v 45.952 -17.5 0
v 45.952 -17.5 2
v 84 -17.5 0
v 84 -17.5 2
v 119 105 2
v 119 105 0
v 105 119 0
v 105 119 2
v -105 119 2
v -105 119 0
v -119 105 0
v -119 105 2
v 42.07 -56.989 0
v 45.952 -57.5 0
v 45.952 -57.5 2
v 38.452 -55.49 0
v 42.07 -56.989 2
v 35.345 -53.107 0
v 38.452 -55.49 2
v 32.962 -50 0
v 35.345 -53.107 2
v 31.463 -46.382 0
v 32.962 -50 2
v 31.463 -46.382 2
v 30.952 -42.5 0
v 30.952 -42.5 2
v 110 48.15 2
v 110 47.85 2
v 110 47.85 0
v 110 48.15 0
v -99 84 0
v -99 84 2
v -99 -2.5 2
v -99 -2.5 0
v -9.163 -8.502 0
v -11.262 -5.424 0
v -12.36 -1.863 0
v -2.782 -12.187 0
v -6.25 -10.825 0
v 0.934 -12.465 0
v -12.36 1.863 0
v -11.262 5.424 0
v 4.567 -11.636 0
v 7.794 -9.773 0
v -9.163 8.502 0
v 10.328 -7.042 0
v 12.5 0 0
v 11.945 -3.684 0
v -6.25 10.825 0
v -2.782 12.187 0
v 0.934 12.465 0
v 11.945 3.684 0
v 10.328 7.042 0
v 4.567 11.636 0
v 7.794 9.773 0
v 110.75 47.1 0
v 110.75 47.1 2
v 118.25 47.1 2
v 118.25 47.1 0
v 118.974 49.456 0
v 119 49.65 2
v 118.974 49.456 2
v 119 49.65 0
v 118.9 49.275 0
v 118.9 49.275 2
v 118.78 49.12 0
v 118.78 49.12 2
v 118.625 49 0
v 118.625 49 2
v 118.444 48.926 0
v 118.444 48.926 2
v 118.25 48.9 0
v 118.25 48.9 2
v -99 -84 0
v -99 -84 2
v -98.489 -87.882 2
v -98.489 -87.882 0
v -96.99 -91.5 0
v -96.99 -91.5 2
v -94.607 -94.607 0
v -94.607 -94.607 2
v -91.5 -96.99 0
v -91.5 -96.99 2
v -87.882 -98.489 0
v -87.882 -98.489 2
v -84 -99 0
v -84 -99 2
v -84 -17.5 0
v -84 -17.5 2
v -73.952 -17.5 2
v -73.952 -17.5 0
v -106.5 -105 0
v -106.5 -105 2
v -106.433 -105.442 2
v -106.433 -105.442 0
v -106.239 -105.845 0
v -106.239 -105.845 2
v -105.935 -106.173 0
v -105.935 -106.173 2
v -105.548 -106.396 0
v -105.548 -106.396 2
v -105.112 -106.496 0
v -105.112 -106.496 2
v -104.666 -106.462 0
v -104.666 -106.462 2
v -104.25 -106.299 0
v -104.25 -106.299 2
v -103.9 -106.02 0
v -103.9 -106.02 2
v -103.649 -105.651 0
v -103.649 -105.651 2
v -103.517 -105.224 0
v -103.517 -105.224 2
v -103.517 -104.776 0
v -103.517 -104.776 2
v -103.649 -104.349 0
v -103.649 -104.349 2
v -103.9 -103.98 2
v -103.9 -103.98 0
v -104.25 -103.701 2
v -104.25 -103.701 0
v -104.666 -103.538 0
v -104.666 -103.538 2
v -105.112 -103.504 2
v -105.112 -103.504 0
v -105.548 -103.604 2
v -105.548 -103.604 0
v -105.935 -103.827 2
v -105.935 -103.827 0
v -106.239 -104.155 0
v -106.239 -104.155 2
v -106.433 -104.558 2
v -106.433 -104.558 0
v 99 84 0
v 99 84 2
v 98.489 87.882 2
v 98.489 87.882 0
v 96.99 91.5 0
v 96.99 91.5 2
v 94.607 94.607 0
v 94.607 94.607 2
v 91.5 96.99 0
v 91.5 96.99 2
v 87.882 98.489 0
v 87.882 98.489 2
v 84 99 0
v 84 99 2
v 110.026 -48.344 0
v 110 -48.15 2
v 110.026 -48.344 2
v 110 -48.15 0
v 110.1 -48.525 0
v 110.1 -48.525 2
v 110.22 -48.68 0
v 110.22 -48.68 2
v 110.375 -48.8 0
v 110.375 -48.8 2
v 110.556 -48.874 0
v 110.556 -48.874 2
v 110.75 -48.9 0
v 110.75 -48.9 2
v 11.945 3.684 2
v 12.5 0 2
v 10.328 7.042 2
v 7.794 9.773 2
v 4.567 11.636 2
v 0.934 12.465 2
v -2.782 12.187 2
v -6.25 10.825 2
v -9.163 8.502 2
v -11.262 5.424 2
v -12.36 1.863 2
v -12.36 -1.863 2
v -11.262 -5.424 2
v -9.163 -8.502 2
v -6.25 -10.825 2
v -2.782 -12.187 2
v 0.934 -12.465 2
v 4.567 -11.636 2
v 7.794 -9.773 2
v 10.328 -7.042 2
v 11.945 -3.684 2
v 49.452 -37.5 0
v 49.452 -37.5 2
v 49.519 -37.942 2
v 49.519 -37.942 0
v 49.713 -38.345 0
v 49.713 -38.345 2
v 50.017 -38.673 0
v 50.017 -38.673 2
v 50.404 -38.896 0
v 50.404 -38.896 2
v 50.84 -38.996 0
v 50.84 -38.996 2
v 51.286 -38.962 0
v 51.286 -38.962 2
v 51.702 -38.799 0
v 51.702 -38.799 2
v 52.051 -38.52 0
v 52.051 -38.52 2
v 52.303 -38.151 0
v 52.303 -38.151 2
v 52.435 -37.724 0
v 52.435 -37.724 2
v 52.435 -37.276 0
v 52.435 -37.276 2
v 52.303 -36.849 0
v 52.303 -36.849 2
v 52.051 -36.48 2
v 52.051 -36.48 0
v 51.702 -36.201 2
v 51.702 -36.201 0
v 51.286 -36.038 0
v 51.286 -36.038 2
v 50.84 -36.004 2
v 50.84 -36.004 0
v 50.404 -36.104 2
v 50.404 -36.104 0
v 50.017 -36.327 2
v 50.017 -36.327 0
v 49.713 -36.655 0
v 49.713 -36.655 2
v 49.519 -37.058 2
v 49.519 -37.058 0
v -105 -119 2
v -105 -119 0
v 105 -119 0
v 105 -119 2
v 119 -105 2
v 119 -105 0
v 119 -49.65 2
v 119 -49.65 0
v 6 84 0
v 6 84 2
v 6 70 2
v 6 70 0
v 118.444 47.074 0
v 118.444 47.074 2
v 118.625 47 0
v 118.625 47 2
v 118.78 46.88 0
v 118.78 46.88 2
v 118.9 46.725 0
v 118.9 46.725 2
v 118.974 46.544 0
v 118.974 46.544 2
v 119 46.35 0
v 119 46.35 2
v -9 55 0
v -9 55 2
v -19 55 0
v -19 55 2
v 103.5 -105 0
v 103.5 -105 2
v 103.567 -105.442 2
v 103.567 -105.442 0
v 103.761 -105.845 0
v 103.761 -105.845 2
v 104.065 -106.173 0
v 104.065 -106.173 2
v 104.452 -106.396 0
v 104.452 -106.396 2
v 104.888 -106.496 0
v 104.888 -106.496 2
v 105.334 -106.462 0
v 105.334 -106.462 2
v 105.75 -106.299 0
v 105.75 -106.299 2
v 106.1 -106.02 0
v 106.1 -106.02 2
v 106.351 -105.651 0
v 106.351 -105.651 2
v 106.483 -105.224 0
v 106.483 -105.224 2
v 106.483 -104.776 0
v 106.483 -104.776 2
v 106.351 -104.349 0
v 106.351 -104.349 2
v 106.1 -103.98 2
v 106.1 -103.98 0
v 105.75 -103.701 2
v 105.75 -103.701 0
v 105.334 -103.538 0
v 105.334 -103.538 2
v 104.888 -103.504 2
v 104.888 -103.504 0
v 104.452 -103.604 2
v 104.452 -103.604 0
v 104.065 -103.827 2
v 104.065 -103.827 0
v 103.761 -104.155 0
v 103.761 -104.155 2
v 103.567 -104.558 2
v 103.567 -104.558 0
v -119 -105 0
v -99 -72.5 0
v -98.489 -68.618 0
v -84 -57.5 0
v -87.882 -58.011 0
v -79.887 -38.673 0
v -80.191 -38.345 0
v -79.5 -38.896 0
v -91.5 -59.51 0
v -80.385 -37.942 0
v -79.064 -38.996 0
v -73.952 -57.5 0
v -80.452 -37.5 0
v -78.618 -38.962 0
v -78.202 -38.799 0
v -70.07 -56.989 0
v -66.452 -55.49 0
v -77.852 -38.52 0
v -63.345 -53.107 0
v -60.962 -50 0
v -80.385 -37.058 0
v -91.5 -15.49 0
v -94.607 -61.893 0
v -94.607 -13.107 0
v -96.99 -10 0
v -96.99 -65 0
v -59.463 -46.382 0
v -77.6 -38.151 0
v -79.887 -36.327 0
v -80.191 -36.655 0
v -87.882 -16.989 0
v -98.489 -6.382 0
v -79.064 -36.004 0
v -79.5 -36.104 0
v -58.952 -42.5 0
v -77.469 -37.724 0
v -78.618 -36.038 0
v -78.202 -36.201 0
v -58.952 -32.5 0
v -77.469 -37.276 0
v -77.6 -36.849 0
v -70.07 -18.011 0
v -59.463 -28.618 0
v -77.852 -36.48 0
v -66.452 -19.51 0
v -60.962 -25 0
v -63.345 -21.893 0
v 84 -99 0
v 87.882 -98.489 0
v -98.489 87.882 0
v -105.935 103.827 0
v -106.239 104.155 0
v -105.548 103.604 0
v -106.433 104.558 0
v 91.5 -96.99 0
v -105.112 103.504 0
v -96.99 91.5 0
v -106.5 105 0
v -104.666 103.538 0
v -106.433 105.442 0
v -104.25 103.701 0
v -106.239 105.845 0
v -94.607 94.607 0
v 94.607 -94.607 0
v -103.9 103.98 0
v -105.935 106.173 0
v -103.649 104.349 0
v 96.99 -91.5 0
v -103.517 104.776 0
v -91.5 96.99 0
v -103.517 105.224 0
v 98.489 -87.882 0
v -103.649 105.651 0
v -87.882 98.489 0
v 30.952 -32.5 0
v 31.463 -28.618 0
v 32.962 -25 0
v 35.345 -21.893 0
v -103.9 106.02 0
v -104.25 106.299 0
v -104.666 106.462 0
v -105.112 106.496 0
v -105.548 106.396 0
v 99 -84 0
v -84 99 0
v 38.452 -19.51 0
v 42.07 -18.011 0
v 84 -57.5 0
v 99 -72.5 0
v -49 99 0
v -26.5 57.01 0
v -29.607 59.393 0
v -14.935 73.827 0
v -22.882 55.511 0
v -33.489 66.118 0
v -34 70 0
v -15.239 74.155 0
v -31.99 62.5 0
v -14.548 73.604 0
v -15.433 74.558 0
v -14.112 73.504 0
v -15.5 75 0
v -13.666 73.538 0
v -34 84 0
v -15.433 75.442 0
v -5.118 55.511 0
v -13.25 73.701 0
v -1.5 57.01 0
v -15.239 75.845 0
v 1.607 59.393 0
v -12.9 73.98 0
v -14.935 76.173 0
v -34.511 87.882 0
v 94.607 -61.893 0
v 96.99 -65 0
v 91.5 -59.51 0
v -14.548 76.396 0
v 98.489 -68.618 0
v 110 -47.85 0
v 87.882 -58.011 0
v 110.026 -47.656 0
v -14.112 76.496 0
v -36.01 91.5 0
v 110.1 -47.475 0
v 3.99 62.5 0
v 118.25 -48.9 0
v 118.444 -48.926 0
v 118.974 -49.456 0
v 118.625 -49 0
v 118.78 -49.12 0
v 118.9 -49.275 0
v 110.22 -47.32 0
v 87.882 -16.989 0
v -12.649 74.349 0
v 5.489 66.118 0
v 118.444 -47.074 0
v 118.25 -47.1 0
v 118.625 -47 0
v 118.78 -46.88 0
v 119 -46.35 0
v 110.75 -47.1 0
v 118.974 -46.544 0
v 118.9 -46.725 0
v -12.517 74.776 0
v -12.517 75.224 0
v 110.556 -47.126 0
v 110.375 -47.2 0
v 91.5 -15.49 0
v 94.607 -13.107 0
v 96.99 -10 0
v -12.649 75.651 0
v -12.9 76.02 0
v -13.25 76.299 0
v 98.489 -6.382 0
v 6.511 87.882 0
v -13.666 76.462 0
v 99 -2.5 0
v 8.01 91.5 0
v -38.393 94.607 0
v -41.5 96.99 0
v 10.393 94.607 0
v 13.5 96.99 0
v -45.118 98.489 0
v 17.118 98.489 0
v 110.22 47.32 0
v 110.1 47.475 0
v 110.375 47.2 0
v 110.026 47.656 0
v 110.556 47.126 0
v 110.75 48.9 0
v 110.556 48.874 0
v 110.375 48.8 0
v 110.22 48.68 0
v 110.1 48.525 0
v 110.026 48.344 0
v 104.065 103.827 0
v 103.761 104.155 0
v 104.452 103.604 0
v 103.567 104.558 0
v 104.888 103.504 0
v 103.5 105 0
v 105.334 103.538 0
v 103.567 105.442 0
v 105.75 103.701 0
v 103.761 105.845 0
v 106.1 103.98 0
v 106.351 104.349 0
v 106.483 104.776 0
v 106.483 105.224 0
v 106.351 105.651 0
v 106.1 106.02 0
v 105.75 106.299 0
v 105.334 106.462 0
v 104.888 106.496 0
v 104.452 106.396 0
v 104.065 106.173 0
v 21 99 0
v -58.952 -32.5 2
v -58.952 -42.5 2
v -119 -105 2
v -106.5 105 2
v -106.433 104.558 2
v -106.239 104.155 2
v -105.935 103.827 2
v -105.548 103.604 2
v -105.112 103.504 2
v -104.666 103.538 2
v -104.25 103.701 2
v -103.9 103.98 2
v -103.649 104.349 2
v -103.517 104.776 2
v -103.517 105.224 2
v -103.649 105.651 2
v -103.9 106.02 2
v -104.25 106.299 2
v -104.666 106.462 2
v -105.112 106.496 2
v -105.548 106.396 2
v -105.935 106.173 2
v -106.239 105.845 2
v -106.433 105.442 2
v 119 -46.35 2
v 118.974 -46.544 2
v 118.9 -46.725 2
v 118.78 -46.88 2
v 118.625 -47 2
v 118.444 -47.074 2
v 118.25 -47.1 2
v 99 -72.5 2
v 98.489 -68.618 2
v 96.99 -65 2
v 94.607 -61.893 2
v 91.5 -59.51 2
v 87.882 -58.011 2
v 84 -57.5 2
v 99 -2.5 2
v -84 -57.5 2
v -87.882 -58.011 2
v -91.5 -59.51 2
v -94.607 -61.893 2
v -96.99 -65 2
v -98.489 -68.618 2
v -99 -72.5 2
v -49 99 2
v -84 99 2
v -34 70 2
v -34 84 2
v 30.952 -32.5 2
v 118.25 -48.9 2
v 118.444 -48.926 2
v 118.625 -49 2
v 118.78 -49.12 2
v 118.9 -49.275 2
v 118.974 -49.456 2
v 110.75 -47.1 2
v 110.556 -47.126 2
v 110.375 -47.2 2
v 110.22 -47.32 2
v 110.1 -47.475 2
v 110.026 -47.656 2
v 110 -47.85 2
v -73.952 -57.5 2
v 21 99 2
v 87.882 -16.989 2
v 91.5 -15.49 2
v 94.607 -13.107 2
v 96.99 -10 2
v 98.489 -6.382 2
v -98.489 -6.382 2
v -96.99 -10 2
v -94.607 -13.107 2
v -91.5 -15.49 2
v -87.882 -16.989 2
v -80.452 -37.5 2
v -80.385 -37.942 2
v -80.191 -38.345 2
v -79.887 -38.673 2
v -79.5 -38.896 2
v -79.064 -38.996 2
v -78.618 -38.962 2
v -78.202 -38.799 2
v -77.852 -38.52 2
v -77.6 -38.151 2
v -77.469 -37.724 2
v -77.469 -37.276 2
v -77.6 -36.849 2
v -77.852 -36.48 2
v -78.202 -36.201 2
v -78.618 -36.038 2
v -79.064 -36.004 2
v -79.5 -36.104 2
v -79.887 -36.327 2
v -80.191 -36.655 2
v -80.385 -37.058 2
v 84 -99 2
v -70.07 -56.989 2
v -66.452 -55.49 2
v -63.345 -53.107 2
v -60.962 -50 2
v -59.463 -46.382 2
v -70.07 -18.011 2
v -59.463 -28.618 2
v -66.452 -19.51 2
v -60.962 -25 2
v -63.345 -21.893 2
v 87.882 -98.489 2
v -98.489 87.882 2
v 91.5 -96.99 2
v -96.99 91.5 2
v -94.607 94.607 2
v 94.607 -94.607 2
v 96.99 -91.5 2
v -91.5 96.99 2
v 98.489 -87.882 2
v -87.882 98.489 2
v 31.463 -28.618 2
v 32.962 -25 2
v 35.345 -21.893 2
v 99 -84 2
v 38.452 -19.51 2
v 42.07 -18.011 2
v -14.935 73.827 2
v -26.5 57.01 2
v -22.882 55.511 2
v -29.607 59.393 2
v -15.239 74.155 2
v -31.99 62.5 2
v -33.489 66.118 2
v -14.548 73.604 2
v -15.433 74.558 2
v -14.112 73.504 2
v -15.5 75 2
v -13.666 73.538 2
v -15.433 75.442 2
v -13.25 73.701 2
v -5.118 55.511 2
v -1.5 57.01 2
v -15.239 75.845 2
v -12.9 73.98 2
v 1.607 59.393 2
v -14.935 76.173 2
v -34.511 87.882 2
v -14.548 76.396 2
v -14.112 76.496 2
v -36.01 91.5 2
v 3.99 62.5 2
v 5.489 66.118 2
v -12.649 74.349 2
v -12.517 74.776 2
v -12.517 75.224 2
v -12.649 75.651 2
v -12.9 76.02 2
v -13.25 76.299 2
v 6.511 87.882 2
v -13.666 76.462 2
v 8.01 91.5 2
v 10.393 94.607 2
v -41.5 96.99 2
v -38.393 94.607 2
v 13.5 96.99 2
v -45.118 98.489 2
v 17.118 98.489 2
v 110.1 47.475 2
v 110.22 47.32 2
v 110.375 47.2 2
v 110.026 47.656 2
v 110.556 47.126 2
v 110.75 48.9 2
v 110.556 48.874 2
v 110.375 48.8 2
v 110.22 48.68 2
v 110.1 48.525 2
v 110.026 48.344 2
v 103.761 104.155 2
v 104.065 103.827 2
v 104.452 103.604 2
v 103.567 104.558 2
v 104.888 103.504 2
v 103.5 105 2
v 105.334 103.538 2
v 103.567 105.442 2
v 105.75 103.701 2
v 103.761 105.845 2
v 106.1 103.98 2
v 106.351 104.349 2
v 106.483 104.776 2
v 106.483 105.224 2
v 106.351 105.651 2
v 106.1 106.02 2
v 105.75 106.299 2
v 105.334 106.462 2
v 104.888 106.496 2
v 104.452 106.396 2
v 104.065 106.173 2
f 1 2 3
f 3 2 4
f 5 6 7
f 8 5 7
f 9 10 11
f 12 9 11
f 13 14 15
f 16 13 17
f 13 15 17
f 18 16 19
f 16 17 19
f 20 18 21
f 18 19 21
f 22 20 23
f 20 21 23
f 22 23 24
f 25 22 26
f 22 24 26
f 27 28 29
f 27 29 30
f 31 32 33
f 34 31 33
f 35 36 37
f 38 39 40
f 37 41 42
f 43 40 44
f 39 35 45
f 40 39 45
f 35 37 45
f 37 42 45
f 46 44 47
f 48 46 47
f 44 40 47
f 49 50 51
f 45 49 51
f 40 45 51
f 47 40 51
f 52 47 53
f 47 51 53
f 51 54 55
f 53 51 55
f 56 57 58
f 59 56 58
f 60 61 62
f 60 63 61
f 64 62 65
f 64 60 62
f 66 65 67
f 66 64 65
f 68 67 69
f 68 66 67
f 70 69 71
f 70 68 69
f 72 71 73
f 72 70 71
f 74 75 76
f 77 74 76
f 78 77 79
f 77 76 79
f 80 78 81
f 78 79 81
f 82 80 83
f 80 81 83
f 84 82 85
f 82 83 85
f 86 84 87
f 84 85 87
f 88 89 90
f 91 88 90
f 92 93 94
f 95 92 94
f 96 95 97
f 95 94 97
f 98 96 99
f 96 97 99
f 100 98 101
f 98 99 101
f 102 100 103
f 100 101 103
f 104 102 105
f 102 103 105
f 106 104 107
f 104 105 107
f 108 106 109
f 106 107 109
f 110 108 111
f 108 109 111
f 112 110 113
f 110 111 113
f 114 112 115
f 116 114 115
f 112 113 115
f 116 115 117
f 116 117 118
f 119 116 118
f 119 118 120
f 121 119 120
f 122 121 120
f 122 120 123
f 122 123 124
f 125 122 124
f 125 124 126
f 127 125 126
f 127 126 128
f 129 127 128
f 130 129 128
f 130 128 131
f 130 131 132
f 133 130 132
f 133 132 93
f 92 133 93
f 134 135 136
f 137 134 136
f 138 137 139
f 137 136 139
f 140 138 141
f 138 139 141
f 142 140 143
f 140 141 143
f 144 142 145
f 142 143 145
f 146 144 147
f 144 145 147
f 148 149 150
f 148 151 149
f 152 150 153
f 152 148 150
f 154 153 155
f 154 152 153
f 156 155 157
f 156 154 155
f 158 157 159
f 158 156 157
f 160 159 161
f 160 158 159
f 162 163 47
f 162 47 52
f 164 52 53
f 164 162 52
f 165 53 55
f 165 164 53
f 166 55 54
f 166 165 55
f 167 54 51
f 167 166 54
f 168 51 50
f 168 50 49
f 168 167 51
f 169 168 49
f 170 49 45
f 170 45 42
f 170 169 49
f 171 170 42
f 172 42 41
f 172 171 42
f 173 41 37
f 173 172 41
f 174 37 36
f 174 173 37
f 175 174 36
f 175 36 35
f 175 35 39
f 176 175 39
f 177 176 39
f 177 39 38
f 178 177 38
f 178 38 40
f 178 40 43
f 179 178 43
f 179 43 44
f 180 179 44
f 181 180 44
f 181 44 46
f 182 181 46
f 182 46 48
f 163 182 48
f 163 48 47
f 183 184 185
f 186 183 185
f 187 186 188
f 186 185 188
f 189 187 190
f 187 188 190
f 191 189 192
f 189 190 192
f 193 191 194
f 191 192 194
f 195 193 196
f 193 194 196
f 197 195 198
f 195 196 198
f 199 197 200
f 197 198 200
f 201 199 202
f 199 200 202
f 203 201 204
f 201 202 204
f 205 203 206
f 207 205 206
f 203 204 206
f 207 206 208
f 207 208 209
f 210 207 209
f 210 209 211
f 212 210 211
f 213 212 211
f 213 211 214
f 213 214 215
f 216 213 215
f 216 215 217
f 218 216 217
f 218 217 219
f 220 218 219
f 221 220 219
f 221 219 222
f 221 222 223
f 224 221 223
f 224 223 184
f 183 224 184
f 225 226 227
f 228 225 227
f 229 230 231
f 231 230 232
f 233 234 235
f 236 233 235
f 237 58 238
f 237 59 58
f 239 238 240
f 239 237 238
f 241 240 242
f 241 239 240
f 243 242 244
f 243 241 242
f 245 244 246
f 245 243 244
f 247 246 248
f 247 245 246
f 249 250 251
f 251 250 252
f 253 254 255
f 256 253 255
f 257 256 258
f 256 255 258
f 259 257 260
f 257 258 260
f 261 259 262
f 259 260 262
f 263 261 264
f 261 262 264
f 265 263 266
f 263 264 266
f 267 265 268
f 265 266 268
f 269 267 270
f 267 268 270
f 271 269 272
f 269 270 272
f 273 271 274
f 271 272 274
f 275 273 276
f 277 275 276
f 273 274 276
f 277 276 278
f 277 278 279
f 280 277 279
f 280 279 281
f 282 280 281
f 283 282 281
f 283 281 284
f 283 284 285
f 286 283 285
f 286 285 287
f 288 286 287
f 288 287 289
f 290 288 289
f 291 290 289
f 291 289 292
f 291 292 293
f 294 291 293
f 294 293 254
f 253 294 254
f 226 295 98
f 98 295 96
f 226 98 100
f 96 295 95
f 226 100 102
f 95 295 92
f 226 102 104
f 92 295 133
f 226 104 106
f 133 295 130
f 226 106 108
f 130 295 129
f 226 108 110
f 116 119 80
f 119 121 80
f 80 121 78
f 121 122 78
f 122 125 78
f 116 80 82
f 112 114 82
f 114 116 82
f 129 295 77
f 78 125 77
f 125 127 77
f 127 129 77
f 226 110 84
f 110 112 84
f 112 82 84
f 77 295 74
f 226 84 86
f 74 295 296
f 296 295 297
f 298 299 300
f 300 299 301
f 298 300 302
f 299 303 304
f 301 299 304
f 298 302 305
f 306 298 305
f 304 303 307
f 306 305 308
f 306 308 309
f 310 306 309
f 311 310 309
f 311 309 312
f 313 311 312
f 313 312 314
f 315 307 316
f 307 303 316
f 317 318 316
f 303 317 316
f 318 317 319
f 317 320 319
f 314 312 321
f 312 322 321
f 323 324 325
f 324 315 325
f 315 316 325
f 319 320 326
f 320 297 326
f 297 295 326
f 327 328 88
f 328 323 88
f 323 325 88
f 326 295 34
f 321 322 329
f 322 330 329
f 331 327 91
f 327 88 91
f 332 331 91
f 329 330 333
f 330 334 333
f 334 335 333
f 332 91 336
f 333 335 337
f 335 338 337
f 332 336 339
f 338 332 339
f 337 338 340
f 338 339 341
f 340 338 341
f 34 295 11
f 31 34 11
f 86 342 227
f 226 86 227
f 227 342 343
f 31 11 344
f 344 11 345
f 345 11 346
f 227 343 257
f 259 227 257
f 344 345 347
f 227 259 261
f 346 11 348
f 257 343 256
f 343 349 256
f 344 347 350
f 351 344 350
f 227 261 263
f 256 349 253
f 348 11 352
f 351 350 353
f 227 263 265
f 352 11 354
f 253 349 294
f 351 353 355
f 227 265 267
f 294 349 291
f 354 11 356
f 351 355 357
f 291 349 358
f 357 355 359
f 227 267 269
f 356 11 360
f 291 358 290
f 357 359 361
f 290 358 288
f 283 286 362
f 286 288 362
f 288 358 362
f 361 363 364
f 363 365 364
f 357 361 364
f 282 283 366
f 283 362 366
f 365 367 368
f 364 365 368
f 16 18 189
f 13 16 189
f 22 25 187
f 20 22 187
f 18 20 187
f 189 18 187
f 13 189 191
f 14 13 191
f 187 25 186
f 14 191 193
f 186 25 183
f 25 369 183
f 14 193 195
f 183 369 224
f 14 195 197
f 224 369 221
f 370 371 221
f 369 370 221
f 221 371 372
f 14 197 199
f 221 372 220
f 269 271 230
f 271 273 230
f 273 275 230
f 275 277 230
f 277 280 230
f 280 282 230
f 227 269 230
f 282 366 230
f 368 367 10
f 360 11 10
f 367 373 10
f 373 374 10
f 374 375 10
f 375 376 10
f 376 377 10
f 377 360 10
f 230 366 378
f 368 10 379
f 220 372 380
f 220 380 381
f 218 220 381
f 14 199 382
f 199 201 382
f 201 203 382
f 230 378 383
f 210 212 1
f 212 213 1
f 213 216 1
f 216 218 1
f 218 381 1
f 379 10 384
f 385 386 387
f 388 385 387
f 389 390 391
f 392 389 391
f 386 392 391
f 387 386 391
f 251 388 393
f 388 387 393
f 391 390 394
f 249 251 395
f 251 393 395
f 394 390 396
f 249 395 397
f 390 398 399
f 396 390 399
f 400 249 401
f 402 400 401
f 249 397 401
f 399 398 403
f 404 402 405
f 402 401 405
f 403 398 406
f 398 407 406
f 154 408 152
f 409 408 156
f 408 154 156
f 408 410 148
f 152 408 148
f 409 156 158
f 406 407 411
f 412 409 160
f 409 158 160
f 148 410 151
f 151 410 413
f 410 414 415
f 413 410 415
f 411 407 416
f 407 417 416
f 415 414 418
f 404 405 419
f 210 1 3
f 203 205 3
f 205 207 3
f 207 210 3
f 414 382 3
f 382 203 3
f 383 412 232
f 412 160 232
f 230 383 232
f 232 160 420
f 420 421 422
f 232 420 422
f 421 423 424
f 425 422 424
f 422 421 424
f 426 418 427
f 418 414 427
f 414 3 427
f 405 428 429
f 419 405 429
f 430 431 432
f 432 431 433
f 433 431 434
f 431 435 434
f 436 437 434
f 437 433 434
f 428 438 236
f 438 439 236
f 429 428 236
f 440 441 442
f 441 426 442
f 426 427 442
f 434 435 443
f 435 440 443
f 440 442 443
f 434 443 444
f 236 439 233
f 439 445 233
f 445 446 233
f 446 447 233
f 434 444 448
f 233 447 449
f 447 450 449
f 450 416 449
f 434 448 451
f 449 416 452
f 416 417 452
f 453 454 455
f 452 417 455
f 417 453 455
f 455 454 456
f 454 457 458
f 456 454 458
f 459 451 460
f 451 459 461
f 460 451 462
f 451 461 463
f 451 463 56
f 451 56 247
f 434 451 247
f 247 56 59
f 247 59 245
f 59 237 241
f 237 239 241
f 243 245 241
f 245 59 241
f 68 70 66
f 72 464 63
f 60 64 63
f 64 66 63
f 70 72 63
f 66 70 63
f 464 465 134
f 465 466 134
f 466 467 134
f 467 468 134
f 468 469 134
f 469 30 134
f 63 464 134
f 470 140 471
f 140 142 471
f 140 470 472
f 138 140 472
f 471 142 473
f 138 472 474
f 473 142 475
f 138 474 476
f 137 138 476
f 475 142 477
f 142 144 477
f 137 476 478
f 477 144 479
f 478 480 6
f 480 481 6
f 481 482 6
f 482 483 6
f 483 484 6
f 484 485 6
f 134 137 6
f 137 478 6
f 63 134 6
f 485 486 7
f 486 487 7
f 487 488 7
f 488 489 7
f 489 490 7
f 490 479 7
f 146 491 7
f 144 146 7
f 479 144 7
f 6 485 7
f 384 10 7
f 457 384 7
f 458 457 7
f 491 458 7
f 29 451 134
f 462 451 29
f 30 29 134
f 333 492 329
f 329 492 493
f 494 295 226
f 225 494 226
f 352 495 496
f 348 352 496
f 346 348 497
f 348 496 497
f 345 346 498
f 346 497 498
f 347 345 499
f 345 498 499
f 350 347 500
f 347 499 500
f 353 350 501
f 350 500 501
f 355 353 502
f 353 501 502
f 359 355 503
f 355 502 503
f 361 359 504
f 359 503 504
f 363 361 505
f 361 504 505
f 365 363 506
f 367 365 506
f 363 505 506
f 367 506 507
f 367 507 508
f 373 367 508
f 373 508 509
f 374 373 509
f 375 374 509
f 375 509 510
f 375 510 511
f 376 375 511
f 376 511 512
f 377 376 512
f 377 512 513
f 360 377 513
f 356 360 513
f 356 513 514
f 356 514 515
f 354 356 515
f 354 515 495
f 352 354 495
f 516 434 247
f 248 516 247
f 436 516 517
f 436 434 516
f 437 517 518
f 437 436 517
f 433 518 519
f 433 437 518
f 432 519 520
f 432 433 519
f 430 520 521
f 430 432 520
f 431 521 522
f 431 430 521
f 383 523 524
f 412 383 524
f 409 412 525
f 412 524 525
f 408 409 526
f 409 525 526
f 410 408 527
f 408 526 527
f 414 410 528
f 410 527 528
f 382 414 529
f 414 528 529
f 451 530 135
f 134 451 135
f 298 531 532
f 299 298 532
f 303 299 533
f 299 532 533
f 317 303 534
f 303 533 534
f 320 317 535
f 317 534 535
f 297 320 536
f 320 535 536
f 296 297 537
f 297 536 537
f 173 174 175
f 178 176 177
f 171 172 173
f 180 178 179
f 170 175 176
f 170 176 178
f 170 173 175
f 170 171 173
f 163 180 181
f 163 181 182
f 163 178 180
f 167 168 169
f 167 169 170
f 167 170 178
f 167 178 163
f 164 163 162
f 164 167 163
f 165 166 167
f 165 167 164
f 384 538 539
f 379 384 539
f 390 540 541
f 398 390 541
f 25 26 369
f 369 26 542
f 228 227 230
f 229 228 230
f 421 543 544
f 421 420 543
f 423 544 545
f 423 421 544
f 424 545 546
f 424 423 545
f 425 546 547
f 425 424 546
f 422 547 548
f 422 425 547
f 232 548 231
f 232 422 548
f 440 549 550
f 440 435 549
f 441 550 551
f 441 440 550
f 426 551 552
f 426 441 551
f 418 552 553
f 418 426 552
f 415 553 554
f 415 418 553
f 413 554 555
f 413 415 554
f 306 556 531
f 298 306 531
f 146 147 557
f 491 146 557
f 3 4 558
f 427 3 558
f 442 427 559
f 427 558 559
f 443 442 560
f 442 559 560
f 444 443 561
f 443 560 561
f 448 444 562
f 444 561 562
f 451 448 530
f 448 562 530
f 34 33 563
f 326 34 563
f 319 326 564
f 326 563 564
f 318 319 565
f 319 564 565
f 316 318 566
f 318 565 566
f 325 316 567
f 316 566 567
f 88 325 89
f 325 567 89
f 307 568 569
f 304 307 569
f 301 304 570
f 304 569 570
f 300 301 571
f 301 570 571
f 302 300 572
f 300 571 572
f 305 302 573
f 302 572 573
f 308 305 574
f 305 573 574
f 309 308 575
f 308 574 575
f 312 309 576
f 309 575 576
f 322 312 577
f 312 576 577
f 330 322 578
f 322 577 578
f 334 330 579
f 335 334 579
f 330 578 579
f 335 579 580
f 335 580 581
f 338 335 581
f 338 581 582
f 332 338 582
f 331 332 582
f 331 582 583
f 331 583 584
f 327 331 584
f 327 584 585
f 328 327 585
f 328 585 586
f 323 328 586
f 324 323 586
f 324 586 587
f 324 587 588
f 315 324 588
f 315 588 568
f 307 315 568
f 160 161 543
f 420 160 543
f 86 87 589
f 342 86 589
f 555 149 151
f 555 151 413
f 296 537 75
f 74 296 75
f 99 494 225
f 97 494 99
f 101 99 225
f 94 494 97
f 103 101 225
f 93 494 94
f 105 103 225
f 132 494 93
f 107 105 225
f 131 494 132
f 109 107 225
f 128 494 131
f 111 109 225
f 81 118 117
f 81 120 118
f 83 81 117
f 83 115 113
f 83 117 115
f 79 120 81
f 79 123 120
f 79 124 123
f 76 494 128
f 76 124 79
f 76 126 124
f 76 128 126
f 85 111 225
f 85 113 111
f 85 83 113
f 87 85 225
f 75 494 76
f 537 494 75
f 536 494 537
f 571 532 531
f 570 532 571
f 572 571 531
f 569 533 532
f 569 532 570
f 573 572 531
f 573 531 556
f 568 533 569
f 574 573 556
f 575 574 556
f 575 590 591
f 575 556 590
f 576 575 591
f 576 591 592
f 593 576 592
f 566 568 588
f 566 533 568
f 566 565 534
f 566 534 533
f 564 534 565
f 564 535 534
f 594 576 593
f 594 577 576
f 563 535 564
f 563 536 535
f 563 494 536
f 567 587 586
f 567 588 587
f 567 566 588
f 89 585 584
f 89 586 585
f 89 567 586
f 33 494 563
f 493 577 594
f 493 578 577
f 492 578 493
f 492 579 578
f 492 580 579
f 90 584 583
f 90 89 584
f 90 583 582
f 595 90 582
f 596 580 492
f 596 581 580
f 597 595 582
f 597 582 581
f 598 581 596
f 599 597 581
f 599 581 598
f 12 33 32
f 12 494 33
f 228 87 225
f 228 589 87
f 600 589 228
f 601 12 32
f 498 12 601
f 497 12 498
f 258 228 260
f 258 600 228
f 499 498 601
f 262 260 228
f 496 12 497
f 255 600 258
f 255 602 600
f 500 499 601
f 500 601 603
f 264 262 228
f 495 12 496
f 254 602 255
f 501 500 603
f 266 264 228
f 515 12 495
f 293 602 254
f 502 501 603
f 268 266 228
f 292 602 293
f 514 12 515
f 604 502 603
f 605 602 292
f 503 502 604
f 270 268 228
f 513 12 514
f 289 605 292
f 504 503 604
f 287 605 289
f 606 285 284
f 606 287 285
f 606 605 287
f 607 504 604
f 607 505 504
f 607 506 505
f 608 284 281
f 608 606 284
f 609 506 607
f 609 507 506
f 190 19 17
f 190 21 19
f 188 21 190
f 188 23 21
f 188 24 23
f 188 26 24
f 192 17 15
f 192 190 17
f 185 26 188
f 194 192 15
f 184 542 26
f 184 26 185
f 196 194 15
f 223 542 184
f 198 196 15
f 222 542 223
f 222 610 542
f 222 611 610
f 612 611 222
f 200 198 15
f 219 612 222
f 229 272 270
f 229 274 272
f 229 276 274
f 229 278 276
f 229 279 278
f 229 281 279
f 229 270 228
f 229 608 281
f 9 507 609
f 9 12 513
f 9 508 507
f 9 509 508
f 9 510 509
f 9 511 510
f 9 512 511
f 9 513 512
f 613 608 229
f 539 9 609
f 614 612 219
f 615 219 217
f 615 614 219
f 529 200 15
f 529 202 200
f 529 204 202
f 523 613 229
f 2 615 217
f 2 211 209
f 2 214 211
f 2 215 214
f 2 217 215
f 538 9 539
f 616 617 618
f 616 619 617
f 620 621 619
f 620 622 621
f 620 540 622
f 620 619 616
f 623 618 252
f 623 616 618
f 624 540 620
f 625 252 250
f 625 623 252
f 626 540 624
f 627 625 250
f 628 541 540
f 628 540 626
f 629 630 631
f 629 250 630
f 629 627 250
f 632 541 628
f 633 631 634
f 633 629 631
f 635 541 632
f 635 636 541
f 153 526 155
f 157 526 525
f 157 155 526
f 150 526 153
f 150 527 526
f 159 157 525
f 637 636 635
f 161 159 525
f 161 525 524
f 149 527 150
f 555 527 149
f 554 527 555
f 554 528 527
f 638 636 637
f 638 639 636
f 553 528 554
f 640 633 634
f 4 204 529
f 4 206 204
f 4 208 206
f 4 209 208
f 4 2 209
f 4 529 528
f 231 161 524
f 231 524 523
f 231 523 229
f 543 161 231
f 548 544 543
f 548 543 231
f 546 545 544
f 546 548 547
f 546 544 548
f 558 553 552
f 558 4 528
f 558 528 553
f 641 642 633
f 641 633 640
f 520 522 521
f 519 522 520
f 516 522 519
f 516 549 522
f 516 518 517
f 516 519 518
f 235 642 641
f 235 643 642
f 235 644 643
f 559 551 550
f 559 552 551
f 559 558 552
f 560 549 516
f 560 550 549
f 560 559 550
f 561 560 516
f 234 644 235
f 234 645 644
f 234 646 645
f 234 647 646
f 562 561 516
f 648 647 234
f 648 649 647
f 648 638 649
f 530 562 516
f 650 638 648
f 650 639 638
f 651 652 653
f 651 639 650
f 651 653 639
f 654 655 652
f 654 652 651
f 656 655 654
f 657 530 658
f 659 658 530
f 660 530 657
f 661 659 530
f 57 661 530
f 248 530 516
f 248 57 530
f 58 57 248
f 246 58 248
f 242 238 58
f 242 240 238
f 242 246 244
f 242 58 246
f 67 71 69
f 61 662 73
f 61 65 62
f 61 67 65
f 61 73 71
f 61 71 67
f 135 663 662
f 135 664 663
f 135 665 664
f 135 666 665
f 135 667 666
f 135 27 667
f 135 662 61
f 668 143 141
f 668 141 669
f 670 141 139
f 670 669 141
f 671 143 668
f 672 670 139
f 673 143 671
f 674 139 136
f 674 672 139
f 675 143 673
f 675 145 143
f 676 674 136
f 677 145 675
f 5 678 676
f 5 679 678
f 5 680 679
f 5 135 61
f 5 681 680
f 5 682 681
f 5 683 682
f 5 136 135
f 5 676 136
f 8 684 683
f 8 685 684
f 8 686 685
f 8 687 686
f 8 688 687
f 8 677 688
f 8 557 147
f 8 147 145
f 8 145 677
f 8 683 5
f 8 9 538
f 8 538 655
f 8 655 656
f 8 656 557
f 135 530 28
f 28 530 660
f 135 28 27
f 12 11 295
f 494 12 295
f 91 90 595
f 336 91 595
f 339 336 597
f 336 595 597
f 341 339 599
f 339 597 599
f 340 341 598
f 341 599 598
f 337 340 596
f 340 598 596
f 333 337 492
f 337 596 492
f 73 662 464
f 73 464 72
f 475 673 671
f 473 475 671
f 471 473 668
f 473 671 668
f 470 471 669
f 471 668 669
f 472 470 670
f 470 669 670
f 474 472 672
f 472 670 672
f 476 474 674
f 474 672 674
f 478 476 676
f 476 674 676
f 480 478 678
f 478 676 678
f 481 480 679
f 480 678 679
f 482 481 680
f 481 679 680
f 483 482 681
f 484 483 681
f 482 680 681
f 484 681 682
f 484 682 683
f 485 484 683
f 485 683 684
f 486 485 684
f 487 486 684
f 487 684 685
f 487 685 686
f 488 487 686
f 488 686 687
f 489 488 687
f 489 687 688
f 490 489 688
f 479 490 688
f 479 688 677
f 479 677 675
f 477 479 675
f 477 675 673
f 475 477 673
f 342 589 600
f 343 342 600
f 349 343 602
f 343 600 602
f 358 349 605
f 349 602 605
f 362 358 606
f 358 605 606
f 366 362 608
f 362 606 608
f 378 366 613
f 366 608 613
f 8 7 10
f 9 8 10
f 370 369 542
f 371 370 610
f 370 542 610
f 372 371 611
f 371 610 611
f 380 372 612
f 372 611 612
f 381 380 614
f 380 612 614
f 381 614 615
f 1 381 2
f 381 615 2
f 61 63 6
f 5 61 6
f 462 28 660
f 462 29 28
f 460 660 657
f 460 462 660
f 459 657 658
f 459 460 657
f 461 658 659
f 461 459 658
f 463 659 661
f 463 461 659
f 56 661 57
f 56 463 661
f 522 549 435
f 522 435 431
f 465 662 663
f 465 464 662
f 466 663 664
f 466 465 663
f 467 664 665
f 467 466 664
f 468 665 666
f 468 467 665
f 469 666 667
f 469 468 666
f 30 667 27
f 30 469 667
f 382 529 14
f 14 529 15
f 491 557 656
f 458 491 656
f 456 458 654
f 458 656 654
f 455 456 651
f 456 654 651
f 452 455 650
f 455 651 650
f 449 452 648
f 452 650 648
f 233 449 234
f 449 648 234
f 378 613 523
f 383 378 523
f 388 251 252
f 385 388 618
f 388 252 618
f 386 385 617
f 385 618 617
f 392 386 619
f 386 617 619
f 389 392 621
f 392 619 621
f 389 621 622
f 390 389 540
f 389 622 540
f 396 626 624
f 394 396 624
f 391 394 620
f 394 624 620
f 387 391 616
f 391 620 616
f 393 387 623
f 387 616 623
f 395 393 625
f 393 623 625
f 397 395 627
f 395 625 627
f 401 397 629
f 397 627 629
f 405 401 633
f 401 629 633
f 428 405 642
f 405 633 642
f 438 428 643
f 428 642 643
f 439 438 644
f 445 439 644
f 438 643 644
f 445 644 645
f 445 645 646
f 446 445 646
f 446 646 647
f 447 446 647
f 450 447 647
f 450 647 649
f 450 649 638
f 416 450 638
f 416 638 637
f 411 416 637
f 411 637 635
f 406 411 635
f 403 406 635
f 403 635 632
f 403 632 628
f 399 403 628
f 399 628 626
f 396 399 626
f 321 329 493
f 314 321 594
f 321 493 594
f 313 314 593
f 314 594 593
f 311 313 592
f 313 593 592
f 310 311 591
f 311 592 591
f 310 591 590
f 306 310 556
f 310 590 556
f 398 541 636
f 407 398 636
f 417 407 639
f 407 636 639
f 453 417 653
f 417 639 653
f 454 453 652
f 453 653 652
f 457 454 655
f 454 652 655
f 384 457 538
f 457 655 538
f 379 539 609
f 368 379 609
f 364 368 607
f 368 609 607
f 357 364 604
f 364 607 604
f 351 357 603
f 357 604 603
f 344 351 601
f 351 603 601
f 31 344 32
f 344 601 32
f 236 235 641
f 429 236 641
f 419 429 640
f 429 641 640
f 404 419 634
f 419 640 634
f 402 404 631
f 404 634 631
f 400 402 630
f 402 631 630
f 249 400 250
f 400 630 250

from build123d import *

# Parameters (mm, degrees)
F1_DEPTH = 2
F2_D     = 3
F3_R     = 12.5
F3_W     = 9
F3_H     = 1.8
F4_DEPTH = 25
F5_R     = 0.75


with BuildPart() as f1:
    # F0 (on Top) → F1 (new body)
    with BuildSketch(Plane.XY):
        Polygon((119, 105), (105, 119), (-105, 119), (-119, 105), (-119, -105), (-105, -119), (105, -119), (119, -105), align=None)
    extrude(amount=F1_DEPTH)

    # F2 (through all)
    with Locations(Plane(origin=(0, 0, 0), x_dir=(1, 0, 0), z_dir=(0, 0, -1))):
        with Locations((-105, -105), (105, -105), (-105, 105), (105, 105), (-14, -75), (50.9519052838, 37.5), (-78.9519052838, 37.5)):
            Hole(F2_D / 2)

    # F3 (on face) → F4 (cut)
    with BuildSketch(Plane.XY.offset(2)):
        with BuildLine():
            Line((-99, 84), (-99, -2.5))
            ThreePointArc((-99, -2.5), (-94.6066017178, -13.1066017178), (-84, -17.5))
            Line((-84, -17.5), (-73.9519052838, -17.5))
            ThreePointArc((-73.9519052838, -17.5), (-63.345303566, -21.8933982822), (-58.9519052838, -32.5))
            Line((-58.9519052838, -32.5), (-58.9519052838, -42.5))
            ThreePointArc((-58.9519052838, -42.5), (-63.345303566, -53.1066017178), (-73.9519052838, -57.5))
            Line((-73.9519052838, -57.5), (-84, -57.5))
            ThreePointArc((-84, -57.5), (-94.6066017178, -61.8933982822), (-99, -72.5))
            Line((-99, -72.5), (-99, -84))
            ThreePointArc((-99, -84), (-94.6066017178, -94.6066017178), (-84, -99))
            Line((-84, -99), (84, -99))
            ThreePointArc((84, -99), (94.6066017178, -94.6066017178), (99, -84))
            Line((99, -84), (99, -72.5))
            ThreePointArc((99, -72.5), (94.6066017178, -61.8933982822), (84, -57.5))
            Line((84, -57.5), (45.9519052838, -57.5))
            ThreePointArc((45.9519052838, -57.5), (35.345303566, -53.1066017178), (30.9519052838, -42.5))
            Line((30.9519052838, -42.5), (30.9519052838, -37.5))
            Line((30.9519052838, -37.5), (30.9519052838, -32.5))
            ThreePointArc((30.9519052838, -32.5), (35.345303566, -21.8933982822), (45.9519052838, -17.5))
            Line((45.9519052838, -17.5), (84, -17.5))
            ThreePointArc((84, -17.5), (94.6066017178, -13.1066017178), (99, -2.5))
            Line((99, -2.5), (99, 40.75))
            Line((99, 40.75), (99, 84))
            ThreePointArc((99, 84), (94.6066017178, 94.6066017178), (84, 99))
            Line((84, 99), (21, 99))
            ThreePointArc((21, 99), (10.3933982822, 94.6066017178), (6, 84))
            Line((6, 84), (6, 70))
            ThreePointArc((6, 70), (1.6066017178, 59.3933982822), (-9, 55))
            Line((-9, 55), (-19, 55))
            ThreePointArc((-19, 55), (-29.6066017178, 59.3933982822), (-34, 70))
            Line((-34, 70), (-34, 84))
            ThreePointArc((-34, 84), (-38.3933982822, 94.6066017178), (-49, 99))
            Line((-49, 99), (-84, 99))
            ThreePointArc((-84, 99), (-94.6066017178, 94.6066017178), (-99, 84))
        make_face()
        Circle(F3_R, mode=Mode.SUBTRACT)
        with Locations((114.5, 48)):
            Rectangle(F3_W, F3_H)
        with Locations((114.5, -48)):
            Rectangle(F3_W, F3_H)
    extrude(amount=-F4_DEPTH, mode=Mode.SUBTRACT)

    # F5
    f5_edges = [f1.edges().sort_by_distance(p)[0] for p in [
        (119, -48.9, 1),
        (119, -47.1, 1),
        (119, 48.9, 1),
        (119, 47.1, 1),
        (110, 48.9, 1),
        (110, 47.1, 1),
        (110, -48.9, 1),
        (110, -47.1, 1),
    ]]
    fillet(f5_edges, radius=F5_R)


solid = f1.part
